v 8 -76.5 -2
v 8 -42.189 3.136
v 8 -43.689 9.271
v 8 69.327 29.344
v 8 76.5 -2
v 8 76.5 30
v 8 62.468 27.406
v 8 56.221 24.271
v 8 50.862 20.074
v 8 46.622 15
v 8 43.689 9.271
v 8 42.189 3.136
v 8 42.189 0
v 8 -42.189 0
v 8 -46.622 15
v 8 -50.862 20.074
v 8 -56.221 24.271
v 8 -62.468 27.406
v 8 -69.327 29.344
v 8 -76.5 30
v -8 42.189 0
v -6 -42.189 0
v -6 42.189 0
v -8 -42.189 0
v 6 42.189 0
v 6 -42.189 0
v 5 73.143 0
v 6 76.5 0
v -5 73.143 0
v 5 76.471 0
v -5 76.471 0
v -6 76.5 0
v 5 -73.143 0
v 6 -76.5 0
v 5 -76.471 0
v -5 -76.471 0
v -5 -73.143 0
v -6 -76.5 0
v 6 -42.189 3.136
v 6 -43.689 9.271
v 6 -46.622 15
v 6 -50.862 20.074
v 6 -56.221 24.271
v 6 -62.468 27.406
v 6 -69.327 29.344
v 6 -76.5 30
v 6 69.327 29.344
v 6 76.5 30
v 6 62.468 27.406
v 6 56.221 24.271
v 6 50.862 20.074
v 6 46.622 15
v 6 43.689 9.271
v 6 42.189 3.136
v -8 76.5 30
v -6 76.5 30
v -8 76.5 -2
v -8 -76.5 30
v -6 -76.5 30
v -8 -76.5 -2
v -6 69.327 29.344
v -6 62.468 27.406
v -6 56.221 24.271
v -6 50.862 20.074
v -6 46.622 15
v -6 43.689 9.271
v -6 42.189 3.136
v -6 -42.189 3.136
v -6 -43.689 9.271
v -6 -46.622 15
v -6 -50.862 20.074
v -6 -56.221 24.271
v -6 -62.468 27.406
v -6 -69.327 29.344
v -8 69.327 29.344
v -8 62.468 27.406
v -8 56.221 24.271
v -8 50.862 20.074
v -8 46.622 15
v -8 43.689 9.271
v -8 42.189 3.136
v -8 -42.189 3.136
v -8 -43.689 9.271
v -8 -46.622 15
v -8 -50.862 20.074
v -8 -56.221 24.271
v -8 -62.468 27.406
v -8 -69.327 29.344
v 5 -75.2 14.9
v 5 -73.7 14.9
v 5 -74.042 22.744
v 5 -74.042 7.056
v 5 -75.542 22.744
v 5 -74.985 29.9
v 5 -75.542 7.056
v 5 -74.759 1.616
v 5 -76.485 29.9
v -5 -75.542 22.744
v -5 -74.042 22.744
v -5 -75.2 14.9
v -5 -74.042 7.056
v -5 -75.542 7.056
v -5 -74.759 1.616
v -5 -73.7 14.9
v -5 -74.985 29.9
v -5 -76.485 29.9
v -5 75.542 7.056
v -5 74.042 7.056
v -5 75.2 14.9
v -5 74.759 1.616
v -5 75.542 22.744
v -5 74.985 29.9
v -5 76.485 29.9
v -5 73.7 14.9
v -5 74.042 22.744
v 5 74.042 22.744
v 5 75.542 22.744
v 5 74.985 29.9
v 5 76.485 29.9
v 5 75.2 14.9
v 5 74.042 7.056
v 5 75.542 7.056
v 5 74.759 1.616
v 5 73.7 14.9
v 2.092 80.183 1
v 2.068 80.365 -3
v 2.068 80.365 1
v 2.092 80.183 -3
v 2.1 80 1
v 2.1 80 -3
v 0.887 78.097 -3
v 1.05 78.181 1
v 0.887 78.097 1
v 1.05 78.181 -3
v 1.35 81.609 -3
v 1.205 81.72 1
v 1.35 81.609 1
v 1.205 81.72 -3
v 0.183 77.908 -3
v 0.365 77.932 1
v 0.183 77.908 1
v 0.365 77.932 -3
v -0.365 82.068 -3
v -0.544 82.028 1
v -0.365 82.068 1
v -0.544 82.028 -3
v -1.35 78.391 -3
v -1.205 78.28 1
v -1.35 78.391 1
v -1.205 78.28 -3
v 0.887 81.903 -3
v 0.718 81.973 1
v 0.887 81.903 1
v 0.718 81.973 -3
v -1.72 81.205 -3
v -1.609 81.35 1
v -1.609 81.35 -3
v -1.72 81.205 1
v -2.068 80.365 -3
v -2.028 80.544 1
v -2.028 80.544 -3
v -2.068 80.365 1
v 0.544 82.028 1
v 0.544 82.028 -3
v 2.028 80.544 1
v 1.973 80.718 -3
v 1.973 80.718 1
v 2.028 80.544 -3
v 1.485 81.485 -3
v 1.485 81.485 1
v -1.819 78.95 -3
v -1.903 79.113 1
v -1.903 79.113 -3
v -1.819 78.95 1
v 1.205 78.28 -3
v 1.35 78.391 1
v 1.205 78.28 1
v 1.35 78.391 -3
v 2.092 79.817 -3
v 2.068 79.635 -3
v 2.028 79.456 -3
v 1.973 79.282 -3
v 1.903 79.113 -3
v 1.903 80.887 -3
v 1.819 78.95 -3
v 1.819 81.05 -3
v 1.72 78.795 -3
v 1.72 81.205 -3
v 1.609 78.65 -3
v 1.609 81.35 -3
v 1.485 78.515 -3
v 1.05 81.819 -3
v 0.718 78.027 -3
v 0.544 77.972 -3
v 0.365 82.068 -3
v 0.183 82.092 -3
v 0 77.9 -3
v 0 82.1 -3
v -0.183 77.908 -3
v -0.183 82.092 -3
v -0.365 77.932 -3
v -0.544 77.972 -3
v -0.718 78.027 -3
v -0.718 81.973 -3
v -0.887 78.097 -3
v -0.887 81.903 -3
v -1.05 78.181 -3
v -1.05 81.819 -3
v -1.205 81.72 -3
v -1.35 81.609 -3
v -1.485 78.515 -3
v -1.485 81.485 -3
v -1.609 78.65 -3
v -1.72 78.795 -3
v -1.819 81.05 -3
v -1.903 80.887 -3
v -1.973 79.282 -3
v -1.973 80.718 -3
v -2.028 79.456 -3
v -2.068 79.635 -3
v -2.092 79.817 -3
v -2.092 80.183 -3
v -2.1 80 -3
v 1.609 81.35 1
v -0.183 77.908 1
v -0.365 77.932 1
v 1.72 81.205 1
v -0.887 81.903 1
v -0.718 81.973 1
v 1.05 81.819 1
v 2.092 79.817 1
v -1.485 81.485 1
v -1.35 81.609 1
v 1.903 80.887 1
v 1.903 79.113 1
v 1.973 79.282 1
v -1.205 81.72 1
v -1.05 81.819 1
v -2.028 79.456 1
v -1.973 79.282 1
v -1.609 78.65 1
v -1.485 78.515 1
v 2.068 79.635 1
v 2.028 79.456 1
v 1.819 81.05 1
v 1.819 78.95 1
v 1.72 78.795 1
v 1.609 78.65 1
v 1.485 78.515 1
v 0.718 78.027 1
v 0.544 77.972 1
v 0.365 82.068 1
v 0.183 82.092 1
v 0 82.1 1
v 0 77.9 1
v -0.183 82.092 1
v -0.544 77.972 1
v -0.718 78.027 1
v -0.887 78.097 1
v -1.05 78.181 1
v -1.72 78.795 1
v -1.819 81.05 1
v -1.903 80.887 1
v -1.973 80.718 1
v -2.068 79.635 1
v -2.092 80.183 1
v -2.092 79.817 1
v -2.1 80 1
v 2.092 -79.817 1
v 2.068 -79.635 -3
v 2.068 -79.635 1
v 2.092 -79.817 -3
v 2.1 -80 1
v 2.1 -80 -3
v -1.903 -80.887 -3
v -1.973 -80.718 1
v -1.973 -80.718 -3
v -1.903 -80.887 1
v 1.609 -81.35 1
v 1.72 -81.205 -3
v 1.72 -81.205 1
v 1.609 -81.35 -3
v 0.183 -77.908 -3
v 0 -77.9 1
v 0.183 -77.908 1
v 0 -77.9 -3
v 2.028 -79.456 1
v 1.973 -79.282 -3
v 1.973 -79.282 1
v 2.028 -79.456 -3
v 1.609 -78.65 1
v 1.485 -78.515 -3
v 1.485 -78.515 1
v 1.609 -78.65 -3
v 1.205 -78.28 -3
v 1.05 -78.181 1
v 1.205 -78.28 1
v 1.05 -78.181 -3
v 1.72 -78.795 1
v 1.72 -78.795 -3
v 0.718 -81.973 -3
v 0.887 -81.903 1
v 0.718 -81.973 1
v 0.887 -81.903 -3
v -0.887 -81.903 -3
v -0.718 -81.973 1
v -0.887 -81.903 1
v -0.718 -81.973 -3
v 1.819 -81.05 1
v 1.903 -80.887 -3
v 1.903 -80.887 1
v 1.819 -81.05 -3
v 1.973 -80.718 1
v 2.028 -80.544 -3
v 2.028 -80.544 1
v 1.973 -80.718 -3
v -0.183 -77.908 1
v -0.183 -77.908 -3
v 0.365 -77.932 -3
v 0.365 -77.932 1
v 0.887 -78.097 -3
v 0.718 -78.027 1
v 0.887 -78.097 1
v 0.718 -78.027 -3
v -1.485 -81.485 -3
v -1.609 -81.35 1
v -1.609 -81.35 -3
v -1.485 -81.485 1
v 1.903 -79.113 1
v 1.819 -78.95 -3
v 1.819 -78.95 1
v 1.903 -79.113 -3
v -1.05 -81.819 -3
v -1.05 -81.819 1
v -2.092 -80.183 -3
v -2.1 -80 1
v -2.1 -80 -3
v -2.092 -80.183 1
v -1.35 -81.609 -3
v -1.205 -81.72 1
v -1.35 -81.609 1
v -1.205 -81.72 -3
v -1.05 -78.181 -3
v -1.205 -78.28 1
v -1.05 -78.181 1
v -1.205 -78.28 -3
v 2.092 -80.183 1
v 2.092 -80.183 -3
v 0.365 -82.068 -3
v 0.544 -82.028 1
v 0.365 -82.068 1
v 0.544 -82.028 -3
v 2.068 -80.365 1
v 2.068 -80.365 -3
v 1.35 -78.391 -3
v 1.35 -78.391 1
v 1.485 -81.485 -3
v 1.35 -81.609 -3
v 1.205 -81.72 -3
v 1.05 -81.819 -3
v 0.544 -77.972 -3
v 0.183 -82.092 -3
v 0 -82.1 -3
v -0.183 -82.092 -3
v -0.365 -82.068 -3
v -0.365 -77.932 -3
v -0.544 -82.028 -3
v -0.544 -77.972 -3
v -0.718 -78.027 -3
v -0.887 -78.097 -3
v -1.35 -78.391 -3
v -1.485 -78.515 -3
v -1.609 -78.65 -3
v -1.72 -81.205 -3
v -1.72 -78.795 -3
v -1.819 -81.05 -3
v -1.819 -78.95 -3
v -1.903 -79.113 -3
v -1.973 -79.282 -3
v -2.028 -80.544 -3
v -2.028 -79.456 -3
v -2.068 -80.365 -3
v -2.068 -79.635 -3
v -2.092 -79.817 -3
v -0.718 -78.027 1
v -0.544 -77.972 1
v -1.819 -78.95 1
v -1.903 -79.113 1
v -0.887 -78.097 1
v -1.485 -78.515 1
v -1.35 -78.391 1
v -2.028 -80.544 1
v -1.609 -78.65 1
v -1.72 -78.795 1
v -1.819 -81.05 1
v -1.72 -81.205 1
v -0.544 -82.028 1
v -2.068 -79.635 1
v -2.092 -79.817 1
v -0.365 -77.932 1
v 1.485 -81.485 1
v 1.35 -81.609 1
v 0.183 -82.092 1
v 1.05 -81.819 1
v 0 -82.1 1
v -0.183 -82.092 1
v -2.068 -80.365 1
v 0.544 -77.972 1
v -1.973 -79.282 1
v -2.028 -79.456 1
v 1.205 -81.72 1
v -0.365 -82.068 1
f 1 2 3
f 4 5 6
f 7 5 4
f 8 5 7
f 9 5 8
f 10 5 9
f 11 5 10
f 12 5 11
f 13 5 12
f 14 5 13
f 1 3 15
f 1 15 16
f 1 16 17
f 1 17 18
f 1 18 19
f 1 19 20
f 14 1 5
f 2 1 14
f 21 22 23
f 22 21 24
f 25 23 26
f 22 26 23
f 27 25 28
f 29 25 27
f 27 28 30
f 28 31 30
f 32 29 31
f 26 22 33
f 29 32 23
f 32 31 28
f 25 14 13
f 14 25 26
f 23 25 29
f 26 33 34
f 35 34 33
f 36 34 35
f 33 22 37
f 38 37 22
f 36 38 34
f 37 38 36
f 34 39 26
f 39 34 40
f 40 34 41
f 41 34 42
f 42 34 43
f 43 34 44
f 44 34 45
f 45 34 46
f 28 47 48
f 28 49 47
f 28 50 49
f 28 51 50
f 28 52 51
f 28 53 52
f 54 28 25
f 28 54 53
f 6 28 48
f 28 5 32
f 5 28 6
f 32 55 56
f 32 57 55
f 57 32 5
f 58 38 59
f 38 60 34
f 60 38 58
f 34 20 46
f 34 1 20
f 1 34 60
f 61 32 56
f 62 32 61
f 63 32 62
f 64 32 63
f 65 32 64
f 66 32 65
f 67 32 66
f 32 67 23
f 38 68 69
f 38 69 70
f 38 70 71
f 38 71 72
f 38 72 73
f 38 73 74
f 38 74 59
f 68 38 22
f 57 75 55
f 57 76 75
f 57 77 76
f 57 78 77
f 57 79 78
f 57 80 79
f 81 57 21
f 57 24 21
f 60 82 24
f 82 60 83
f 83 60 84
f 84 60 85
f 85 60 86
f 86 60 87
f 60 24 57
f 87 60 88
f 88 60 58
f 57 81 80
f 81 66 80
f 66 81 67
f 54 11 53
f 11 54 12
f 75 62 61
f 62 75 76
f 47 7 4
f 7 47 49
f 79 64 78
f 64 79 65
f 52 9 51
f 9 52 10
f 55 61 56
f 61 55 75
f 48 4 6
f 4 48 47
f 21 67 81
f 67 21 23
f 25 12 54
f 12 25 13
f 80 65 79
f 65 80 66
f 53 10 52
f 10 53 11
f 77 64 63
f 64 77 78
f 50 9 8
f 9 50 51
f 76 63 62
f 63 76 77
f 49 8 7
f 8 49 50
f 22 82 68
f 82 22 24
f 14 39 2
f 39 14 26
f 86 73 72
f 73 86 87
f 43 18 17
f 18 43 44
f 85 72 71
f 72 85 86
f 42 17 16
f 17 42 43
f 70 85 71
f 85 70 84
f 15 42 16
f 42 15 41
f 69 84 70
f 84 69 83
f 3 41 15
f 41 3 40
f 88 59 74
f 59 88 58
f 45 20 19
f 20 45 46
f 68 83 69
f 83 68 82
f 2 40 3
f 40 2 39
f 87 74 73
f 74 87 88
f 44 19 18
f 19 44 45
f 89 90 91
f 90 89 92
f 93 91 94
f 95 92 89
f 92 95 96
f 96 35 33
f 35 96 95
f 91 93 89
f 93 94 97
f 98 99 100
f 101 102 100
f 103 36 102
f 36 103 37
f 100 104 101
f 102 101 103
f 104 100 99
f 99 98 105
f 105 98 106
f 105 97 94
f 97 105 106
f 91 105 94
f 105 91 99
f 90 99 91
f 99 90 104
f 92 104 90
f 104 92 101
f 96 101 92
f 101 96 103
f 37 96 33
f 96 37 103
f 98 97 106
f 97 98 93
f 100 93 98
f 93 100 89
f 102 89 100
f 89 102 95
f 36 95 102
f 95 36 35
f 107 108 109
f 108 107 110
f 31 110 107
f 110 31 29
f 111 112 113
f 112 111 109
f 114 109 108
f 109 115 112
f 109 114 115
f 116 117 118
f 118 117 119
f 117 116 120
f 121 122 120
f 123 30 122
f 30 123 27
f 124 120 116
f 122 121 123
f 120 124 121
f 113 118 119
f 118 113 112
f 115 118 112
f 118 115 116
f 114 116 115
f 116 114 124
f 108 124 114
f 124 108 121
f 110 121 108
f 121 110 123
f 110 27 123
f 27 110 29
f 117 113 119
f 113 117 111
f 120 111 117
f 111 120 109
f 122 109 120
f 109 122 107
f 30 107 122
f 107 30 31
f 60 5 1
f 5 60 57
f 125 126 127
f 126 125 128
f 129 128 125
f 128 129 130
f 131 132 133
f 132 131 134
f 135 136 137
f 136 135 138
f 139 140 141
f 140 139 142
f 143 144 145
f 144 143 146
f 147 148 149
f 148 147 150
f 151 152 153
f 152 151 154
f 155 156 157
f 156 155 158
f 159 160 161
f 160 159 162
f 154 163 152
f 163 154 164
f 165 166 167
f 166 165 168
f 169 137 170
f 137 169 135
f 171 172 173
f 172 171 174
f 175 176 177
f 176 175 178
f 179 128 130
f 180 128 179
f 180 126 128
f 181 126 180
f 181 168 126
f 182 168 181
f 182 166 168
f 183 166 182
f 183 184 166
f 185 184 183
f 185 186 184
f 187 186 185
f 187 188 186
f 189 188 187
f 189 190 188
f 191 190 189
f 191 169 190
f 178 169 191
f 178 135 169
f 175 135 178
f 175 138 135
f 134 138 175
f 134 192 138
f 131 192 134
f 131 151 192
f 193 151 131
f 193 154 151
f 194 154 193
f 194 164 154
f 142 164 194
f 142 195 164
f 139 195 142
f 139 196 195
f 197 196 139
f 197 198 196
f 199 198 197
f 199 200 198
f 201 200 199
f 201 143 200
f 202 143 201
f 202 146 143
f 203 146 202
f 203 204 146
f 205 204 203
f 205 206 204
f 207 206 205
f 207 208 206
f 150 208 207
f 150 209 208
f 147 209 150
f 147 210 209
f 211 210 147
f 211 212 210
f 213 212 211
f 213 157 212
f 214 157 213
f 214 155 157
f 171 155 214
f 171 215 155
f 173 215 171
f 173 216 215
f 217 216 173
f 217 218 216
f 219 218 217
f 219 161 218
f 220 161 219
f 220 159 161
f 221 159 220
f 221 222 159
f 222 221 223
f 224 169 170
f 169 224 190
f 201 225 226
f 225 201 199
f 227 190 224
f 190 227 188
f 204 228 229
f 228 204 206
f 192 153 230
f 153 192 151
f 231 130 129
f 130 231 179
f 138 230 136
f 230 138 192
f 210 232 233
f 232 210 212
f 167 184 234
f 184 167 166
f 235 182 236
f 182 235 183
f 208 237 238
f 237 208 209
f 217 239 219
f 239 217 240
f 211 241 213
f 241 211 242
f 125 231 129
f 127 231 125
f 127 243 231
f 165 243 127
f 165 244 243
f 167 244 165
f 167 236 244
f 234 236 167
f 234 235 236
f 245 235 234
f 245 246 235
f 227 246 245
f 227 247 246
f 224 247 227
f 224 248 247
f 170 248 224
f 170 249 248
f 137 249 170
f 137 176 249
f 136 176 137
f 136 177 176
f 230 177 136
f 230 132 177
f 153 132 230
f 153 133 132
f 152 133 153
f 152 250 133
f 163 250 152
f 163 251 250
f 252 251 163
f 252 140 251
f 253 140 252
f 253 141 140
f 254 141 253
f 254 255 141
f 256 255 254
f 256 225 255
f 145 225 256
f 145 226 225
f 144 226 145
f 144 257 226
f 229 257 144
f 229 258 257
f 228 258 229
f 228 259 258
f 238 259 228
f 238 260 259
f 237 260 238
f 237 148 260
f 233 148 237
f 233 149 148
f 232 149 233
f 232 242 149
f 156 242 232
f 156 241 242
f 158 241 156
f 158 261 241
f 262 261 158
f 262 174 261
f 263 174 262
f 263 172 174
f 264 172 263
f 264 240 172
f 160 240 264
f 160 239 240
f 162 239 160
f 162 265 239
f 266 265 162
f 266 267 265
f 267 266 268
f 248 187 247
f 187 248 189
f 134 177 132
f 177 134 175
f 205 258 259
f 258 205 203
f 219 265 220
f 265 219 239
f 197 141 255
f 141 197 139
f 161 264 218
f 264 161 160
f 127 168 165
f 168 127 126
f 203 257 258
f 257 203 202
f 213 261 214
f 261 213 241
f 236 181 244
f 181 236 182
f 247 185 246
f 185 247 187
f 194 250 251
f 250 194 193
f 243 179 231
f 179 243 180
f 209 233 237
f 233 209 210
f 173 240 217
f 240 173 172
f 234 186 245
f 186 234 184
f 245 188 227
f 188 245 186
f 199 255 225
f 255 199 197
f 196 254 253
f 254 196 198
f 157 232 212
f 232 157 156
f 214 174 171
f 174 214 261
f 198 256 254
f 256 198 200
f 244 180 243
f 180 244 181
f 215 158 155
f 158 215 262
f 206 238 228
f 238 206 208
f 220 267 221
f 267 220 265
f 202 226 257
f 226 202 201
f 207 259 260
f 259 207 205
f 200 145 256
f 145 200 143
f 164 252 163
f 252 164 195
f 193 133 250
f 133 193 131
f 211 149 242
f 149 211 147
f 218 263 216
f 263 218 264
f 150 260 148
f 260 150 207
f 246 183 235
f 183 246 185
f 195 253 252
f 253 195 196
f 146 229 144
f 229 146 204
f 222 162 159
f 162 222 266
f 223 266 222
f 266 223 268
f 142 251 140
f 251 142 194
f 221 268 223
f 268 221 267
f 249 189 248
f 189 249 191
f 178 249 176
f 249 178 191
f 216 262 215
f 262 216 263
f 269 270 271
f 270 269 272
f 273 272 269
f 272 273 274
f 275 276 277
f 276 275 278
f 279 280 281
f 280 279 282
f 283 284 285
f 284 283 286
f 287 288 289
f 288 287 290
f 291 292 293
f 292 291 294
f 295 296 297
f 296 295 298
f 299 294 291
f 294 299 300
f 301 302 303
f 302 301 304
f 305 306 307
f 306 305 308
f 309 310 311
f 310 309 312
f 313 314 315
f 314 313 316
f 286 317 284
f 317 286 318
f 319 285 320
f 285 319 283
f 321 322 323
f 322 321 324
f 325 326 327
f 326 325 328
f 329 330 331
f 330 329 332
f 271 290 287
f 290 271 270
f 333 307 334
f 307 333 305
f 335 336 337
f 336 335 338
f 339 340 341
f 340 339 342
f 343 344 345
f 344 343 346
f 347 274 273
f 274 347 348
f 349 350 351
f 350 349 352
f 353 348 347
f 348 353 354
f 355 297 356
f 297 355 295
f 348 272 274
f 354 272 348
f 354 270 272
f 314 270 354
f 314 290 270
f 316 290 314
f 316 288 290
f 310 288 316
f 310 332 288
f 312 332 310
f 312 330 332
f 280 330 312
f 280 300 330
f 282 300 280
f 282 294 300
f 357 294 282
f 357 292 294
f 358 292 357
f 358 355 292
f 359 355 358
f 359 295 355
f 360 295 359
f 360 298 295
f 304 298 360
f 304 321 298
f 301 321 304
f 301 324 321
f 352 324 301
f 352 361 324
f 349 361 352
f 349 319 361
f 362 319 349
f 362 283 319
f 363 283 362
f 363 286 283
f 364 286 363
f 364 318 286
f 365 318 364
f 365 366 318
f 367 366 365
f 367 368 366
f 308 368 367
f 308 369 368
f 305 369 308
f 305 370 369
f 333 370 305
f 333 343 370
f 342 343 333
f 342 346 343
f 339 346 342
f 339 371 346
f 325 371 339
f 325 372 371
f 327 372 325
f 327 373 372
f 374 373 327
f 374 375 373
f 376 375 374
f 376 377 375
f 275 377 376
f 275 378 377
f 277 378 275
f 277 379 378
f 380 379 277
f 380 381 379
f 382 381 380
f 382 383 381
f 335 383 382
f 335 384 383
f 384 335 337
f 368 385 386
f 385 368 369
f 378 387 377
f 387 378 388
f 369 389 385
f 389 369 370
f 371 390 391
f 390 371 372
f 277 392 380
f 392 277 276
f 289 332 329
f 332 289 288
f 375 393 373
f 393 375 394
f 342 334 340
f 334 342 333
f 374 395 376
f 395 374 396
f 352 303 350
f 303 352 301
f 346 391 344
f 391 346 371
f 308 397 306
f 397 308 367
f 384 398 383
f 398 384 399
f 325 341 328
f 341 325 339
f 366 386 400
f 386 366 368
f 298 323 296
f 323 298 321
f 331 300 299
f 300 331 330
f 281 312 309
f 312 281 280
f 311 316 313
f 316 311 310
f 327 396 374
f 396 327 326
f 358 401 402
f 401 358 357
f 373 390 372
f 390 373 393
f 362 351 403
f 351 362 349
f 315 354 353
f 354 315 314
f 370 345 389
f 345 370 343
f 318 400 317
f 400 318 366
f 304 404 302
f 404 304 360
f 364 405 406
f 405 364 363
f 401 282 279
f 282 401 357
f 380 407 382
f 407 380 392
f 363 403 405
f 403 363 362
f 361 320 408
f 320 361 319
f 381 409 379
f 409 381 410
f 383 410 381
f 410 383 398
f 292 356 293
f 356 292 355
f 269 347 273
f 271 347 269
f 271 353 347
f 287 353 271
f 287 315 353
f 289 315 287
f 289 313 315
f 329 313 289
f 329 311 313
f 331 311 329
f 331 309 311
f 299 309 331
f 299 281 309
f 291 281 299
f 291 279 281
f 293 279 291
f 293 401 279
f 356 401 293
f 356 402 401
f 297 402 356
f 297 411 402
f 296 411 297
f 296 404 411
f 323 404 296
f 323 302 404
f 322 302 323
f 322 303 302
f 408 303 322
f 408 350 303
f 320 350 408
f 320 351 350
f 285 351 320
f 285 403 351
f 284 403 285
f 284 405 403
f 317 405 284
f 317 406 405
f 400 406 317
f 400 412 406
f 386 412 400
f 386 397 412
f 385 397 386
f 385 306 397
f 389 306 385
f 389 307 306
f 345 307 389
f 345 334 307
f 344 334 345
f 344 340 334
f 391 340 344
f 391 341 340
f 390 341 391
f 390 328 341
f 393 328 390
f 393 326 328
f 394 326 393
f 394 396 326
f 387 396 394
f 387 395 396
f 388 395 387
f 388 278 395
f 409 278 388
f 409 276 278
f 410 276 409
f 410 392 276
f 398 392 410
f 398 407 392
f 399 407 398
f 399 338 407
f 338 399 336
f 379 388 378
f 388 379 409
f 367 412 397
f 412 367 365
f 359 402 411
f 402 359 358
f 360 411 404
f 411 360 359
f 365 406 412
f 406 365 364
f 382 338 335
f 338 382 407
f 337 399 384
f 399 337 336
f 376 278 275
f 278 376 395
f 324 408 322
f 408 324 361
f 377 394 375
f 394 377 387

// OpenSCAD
holeDepth = 4;
holeOffset = 80;
holeRadius = 2.1;
holeFacets = 72;

wallThickness=2;
overhang=5;
phoneLength = 143;
phoneWidth = 12;
phoneHeight = 76;

union () {
    union() {

        translate([0,0,-wallThickness/2])
            cube([phoneWidth+wallThickness*2,phoneLength+2*overhang,wallThickness],
                  center=true);
        
        intersection () {
            union() {
                translate([(phoneWidth+wallThickness)/2,0,phoneHeight/2])
                    cube([wallThickness,phoneLength+2*overhang,phoneHeight],
                         center=true);
                translate([-(phoneWidth+wallThickness)/2,0,phoneHeight/2])
                    cube([wallThickness,phoneLength+2*overhang,phoneHeight], center=true);
            }
            
            union() {
                translate([0,76.5,0])
                    scale([1,1.15,1])
                        rotate([0,90,0])
                            cylinder(r=30,h=phoneWidth*2, center=true);
                translate([0,-76.5,0])
                    scale([1,1.15,1])
                        rotate([0,90,0])
                        cylinder(r=30,h=phoneWidth*2, center=true);
            }
        }

        
        translate([-5,-76.5+2.8,14.9])
        EndCap();
        
        translate([5,76.5-2.8,14.9])
        rotate([0,0,180])
            EndCap();

    }
    //    translate([0,0,phoneHeight/2])
     //   color("green")
          //  cube([phoneWidth,phoneLength,phoneHeight], center=true);


  //  color("red")cube([50,88,200], center=true);

    
    translate([0,holeOffset,-1])
        cylinder(r=holeRadius,h=holeDepth,
                 center=true, $fn=holeFacets);
    translate([0,-holeOffset,-1])
        cylinder(r=holeRadius,h=holeDepth,
                 center=true, $fn=holeFacets);
            
}

module EndCap()
{    sliceThickness=4;
    radius = 90;
    rotate([90,0,90])
    difference () {
        intersection() {
            union() {
                intersection() {
                    translate([-sliceThickness,-15,0])
                        cube([sliceThickness,30,10]);
                    translate([-radius,0,0])
                    cylinder(r=radius,h=10,$fn=holeFacets);
                }
                
                translate([-2,-18,0])
                rotate([0,0,45])
                cube([4,4,10]);
            }
            cube([100,30,100], center=true);
        }
 
        translate([-radius-1.5,0,-2])
            cylinder(r=radius,h=48,$fn=holeFacets);
    }
}

module Holes() {
    translate([holeOffset,0,0])
        cylinder(r=holeRadius,h=holeDepth,
                 center=true, $fn=holeFacets);
    translate([-holeOffset,0,0])
        cylinder(r=holeRadius,h=holeDepth,
                 center=true, $fn=holeFacets);
    translate([0,holeOffset,0])
        cylinder(r=holeRadius,h=holeDepth,
                 center=true, $fn=holeFacets);
    translate([0,-holeOffset,0])
        cylinder(r=holeRadius,h=holeDepth,
                 center=true, $fn=holeFacets);
}
